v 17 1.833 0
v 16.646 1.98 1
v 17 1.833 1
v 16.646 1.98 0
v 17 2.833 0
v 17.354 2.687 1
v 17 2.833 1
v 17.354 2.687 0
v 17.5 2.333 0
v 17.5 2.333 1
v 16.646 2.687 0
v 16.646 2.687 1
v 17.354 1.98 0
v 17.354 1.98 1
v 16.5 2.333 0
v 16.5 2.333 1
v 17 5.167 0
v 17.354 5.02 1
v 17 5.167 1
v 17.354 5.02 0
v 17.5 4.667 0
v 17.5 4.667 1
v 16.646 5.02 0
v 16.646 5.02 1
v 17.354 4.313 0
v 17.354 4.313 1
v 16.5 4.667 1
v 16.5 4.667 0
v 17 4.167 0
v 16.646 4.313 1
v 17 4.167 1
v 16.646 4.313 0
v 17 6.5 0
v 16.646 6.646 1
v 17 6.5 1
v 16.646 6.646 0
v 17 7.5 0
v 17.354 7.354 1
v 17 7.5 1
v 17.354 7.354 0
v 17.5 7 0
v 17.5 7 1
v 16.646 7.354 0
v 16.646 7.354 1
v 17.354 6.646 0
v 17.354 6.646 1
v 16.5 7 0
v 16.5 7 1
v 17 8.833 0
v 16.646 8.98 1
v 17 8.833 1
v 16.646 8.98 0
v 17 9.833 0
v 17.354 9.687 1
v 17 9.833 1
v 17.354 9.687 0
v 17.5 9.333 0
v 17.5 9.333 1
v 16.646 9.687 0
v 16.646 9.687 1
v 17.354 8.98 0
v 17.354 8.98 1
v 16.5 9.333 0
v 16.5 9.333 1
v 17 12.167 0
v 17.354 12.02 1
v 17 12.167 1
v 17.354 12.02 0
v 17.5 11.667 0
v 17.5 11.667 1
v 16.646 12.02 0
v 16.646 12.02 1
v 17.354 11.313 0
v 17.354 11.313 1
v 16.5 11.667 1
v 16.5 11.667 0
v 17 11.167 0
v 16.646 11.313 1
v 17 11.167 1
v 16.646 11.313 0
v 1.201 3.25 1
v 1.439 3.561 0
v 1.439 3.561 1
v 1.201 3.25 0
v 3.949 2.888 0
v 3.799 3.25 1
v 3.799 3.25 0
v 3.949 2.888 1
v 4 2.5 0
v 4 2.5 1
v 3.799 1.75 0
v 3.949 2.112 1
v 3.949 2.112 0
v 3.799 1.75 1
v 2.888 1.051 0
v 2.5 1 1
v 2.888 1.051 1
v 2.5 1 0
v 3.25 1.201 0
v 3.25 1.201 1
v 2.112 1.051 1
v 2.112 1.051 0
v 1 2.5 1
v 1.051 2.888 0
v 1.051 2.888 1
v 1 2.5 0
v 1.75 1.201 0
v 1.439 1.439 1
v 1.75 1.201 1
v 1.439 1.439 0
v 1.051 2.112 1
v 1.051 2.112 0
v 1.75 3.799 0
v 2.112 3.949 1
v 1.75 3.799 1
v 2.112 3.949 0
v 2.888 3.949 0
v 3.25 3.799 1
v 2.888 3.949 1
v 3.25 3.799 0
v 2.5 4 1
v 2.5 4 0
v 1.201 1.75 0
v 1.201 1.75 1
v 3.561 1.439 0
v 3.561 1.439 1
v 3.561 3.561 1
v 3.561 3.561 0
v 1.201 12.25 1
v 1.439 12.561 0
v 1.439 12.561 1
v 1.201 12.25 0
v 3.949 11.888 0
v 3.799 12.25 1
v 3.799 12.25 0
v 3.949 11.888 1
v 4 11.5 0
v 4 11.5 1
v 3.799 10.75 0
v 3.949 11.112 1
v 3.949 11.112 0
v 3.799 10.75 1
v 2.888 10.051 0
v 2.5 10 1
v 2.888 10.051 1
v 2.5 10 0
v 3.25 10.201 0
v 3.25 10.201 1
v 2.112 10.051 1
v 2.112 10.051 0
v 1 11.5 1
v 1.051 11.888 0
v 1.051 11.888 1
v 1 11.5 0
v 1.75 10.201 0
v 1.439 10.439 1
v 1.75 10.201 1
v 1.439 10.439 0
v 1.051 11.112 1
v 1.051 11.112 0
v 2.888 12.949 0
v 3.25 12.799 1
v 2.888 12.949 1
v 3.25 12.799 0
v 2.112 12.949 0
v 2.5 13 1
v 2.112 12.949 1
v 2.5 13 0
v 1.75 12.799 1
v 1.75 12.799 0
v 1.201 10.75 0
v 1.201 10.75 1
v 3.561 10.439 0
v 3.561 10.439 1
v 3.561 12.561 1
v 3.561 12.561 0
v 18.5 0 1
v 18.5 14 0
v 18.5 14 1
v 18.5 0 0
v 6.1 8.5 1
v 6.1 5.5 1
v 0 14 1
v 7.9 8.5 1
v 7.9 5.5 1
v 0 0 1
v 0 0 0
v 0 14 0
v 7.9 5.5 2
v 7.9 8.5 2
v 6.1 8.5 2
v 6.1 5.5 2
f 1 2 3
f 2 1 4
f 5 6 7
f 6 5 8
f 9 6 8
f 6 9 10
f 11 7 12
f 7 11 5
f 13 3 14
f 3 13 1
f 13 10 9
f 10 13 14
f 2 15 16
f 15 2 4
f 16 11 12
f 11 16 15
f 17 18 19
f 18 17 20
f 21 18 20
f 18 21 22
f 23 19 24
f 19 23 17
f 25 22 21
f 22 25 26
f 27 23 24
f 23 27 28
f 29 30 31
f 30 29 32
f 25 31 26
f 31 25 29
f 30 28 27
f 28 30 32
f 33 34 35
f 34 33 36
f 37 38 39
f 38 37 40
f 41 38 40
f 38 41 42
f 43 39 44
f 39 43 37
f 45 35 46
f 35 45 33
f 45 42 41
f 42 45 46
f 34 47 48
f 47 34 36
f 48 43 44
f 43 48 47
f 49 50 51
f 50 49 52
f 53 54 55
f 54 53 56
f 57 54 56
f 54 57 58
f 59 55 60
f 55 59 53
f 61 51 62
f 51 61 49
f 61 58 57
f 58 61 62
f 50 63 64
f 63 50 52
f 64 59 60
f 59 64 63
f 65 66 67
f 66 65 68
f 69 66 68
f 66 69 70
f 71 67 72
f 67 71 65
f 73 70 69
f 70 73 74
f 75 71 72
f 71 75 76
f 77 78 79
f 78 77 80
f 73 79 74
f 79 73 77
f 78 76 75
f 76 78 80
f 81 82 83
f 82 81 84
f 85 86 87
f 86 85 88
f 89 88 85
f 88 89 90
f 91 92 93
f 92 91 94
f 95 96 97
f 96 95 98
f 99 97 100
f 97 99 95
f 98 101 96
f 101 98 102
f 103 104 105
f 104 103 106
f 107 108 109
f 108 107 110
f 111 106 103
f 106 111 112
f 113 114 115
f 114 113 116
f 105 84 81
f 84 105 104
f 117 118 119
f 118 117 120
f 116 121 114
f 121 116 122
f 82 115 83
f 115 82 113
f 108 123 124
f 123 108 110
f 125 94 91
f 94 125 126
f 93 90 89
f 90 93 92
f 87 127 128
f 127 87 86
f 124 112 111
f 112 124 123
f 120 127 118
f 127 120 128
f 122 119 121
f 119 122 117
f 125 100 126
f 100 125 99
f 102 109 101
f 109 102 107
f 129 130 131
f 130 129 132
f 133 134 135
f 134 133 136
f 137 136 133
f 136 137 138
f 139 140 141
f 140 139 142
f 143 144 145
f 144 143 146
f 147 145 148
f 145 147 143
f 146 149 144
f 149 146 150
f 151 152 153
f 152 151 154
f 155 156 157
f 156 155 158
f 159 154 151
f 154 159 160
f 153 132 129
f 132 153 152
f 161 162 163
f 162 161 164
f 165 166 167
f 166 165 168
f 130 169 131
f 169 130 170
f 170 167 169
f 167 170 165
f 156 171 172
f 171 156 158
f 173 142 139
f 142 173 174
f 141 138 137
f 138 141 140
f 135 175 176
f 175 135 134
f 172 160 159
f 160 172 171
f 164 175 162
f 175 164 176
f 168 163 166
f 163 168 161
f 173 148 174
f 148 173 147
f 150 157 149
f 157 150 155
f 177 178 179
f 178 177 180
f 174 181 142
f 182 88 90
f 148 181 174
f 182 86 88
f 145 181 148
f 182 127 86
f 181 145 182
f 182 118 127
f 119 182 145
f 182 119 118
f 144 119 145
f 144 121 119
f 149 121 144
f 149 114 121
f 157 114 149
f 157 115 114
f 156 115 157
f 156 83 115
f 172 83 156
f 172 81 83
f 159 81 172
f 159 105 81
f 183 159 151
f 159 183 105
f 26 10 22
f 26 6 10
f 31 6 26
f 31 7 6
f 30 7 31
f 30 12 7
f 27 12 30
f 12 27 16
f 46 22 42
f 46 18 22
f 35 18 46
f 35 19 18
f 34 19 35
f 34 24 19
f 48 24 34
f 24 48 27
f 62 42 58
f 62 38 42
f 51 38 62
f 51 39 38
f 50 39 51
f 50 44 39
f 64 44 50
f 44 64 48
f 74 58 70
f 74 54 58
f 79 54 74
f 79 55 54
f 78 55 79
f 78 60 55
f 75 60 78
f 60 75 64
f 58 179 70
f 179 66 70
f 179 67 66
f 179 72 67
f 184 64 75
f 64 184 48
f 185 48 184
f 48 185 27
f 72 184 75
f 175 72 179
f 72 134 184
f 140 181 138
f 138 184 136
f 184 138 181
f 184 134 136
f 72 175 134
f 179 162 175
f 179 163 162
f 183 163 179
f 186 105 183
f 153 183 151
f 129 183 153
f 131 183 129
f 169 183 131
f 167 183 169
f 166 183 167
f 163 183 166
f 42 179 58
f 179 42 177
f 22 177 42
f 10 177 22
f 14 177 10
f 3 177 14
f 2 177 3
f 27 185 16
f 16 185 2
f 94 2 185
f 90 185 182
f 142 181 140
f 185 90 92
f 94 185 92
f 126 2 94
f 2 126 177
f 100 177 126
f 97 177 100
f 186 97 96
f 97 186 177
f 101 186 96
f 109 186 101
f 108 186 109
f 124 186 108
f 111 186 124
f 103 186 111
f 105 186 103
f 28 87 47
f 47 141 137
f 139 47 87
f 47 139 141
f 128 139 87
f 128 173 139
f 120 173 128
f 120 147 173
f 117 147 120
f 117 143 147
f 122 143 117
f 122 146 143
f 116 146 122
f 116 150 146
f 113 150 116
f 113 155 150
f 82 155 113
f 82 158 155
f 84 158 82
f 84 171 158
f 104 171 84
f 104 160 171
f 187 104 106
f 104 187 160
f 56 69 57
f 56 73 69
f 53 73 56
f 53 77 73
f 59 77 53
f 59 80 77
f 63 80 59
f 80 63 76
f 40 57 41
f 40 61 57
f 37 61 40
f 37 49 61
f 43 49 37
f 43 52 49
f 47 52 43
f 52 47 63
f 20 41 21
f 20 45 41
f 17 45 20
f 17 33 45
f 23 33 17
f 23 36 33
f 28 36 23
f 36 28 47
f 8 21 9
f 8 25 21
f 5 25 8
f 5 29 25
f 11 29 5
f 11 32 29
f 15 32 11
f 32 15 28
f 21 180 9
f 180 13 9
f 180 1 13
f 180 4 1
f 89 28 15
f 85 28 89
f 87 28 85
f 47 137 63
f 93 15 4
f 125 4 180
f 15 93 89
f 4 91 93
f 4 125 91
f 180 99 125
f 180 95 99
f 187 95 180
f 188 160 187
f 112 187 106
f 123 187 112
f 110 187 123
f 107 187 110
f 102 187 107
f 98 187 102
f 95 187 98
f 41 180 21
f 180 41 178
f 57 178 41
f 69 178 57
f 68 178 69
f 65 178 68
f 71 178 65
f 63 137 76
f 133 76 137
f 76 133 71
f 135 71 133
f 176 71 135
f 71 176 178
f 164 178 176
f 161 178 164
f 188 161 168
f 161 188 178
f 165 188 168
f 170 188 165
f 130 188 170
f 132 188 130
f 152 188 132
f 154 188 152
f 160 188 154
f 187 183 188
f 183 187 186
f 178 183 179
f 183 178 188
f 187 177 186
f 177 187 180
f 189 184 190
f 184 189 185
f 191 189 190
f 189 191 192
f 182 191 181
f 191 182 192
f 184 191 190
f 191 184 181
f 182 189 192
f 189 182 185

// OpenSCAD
$fa = 1;
$fs = 0.4;

module robotbit() {
  r = 5;
  // base
  difference(){
    translate([r,r,0])
      minkowski(){
        cube([78-2*r,57-2*r,1]);
        cylinder(h=2, r=r);
      }
    // agujeros grandes
    for(x=[3,78-3], y=[5,57-5])
      translate([x,y,0])
        cylinder(h=10, d=4.8, center=true);    
  }
  // batería
  translate([0,16,0])
    cube([78,20,22.5]);  
  // microbit
  translate([12,10,0])
    cube([52,1,50]);
}
//robotbit();
module stepper_28BYJ_48 () {
  // cuerpo
  cylinder(h=19, d=28);
  // alitas  
  difference(){
    hull(){
      for(s=[-1,1])
        translate([35/2*s,0,18])
          cylinder(h=1,d=7);
    }
    for(s=[-1,1])
        translate([35/2*s,0,18])
          cylinder(h=6,d=4,center=true);
  }
  // eje
  translate([0,8,19]) {
    cylinder(h=1.5, d=9);
    cylinder(h=10,d=5);
  }
  // "enchufe"
  translate([-14.6/2,-17,0])
    cube([14.6, 17, 19]);  
}

module servo_s90g () {
  // cuerpo
  cube([22.5,11.8,22.7]);
  // alitas
  difference(){
    translate([-4.7,0,15.9])
      cube([22.5+4.7*2,11.8,2.5]);    
    translate([-2.3,5.9,15])
      cylinder(h=10,d=2);
    translate([22.5+2.3,5.9,15])
      cylinder(h=10,d=2);
  }
  // engranajes
  translate([5.9,5.9,22.7])
    cylinder(h=4,d=11.8);
  translate([5.9+8.8-2.5,5.9,22.7])
    cylinder(h=4,d=5);
  // eje
  translate([5.9,5.9,26.7])
    cylinder(h=3.2,d=4.6);
}

module ldr(){
  cylinder(h=2.4,d=5.1);
  for(s=[-1,1])
    translate([s*3.4/2,0,0])
      cylinder(h=34, d=0.5);  
}

module BH1750 () {
  difference(){ 
    cube([18.5,14,1]);
    for (y=[14/6:14/6:13])
      translate([18.5-1.5,y,0])
        cylinder(h=4,d=1,center=true);
    for (y=[1+1.5,14-1-1.5])
      translate([1+1.5,y,0])
        cylinder(h=4,d=3,center=true);
  }
  color("black")
    translate([7-1.8/2,7-1.5,1])
      cube([1.8,3,1]);
}
BH1750();
